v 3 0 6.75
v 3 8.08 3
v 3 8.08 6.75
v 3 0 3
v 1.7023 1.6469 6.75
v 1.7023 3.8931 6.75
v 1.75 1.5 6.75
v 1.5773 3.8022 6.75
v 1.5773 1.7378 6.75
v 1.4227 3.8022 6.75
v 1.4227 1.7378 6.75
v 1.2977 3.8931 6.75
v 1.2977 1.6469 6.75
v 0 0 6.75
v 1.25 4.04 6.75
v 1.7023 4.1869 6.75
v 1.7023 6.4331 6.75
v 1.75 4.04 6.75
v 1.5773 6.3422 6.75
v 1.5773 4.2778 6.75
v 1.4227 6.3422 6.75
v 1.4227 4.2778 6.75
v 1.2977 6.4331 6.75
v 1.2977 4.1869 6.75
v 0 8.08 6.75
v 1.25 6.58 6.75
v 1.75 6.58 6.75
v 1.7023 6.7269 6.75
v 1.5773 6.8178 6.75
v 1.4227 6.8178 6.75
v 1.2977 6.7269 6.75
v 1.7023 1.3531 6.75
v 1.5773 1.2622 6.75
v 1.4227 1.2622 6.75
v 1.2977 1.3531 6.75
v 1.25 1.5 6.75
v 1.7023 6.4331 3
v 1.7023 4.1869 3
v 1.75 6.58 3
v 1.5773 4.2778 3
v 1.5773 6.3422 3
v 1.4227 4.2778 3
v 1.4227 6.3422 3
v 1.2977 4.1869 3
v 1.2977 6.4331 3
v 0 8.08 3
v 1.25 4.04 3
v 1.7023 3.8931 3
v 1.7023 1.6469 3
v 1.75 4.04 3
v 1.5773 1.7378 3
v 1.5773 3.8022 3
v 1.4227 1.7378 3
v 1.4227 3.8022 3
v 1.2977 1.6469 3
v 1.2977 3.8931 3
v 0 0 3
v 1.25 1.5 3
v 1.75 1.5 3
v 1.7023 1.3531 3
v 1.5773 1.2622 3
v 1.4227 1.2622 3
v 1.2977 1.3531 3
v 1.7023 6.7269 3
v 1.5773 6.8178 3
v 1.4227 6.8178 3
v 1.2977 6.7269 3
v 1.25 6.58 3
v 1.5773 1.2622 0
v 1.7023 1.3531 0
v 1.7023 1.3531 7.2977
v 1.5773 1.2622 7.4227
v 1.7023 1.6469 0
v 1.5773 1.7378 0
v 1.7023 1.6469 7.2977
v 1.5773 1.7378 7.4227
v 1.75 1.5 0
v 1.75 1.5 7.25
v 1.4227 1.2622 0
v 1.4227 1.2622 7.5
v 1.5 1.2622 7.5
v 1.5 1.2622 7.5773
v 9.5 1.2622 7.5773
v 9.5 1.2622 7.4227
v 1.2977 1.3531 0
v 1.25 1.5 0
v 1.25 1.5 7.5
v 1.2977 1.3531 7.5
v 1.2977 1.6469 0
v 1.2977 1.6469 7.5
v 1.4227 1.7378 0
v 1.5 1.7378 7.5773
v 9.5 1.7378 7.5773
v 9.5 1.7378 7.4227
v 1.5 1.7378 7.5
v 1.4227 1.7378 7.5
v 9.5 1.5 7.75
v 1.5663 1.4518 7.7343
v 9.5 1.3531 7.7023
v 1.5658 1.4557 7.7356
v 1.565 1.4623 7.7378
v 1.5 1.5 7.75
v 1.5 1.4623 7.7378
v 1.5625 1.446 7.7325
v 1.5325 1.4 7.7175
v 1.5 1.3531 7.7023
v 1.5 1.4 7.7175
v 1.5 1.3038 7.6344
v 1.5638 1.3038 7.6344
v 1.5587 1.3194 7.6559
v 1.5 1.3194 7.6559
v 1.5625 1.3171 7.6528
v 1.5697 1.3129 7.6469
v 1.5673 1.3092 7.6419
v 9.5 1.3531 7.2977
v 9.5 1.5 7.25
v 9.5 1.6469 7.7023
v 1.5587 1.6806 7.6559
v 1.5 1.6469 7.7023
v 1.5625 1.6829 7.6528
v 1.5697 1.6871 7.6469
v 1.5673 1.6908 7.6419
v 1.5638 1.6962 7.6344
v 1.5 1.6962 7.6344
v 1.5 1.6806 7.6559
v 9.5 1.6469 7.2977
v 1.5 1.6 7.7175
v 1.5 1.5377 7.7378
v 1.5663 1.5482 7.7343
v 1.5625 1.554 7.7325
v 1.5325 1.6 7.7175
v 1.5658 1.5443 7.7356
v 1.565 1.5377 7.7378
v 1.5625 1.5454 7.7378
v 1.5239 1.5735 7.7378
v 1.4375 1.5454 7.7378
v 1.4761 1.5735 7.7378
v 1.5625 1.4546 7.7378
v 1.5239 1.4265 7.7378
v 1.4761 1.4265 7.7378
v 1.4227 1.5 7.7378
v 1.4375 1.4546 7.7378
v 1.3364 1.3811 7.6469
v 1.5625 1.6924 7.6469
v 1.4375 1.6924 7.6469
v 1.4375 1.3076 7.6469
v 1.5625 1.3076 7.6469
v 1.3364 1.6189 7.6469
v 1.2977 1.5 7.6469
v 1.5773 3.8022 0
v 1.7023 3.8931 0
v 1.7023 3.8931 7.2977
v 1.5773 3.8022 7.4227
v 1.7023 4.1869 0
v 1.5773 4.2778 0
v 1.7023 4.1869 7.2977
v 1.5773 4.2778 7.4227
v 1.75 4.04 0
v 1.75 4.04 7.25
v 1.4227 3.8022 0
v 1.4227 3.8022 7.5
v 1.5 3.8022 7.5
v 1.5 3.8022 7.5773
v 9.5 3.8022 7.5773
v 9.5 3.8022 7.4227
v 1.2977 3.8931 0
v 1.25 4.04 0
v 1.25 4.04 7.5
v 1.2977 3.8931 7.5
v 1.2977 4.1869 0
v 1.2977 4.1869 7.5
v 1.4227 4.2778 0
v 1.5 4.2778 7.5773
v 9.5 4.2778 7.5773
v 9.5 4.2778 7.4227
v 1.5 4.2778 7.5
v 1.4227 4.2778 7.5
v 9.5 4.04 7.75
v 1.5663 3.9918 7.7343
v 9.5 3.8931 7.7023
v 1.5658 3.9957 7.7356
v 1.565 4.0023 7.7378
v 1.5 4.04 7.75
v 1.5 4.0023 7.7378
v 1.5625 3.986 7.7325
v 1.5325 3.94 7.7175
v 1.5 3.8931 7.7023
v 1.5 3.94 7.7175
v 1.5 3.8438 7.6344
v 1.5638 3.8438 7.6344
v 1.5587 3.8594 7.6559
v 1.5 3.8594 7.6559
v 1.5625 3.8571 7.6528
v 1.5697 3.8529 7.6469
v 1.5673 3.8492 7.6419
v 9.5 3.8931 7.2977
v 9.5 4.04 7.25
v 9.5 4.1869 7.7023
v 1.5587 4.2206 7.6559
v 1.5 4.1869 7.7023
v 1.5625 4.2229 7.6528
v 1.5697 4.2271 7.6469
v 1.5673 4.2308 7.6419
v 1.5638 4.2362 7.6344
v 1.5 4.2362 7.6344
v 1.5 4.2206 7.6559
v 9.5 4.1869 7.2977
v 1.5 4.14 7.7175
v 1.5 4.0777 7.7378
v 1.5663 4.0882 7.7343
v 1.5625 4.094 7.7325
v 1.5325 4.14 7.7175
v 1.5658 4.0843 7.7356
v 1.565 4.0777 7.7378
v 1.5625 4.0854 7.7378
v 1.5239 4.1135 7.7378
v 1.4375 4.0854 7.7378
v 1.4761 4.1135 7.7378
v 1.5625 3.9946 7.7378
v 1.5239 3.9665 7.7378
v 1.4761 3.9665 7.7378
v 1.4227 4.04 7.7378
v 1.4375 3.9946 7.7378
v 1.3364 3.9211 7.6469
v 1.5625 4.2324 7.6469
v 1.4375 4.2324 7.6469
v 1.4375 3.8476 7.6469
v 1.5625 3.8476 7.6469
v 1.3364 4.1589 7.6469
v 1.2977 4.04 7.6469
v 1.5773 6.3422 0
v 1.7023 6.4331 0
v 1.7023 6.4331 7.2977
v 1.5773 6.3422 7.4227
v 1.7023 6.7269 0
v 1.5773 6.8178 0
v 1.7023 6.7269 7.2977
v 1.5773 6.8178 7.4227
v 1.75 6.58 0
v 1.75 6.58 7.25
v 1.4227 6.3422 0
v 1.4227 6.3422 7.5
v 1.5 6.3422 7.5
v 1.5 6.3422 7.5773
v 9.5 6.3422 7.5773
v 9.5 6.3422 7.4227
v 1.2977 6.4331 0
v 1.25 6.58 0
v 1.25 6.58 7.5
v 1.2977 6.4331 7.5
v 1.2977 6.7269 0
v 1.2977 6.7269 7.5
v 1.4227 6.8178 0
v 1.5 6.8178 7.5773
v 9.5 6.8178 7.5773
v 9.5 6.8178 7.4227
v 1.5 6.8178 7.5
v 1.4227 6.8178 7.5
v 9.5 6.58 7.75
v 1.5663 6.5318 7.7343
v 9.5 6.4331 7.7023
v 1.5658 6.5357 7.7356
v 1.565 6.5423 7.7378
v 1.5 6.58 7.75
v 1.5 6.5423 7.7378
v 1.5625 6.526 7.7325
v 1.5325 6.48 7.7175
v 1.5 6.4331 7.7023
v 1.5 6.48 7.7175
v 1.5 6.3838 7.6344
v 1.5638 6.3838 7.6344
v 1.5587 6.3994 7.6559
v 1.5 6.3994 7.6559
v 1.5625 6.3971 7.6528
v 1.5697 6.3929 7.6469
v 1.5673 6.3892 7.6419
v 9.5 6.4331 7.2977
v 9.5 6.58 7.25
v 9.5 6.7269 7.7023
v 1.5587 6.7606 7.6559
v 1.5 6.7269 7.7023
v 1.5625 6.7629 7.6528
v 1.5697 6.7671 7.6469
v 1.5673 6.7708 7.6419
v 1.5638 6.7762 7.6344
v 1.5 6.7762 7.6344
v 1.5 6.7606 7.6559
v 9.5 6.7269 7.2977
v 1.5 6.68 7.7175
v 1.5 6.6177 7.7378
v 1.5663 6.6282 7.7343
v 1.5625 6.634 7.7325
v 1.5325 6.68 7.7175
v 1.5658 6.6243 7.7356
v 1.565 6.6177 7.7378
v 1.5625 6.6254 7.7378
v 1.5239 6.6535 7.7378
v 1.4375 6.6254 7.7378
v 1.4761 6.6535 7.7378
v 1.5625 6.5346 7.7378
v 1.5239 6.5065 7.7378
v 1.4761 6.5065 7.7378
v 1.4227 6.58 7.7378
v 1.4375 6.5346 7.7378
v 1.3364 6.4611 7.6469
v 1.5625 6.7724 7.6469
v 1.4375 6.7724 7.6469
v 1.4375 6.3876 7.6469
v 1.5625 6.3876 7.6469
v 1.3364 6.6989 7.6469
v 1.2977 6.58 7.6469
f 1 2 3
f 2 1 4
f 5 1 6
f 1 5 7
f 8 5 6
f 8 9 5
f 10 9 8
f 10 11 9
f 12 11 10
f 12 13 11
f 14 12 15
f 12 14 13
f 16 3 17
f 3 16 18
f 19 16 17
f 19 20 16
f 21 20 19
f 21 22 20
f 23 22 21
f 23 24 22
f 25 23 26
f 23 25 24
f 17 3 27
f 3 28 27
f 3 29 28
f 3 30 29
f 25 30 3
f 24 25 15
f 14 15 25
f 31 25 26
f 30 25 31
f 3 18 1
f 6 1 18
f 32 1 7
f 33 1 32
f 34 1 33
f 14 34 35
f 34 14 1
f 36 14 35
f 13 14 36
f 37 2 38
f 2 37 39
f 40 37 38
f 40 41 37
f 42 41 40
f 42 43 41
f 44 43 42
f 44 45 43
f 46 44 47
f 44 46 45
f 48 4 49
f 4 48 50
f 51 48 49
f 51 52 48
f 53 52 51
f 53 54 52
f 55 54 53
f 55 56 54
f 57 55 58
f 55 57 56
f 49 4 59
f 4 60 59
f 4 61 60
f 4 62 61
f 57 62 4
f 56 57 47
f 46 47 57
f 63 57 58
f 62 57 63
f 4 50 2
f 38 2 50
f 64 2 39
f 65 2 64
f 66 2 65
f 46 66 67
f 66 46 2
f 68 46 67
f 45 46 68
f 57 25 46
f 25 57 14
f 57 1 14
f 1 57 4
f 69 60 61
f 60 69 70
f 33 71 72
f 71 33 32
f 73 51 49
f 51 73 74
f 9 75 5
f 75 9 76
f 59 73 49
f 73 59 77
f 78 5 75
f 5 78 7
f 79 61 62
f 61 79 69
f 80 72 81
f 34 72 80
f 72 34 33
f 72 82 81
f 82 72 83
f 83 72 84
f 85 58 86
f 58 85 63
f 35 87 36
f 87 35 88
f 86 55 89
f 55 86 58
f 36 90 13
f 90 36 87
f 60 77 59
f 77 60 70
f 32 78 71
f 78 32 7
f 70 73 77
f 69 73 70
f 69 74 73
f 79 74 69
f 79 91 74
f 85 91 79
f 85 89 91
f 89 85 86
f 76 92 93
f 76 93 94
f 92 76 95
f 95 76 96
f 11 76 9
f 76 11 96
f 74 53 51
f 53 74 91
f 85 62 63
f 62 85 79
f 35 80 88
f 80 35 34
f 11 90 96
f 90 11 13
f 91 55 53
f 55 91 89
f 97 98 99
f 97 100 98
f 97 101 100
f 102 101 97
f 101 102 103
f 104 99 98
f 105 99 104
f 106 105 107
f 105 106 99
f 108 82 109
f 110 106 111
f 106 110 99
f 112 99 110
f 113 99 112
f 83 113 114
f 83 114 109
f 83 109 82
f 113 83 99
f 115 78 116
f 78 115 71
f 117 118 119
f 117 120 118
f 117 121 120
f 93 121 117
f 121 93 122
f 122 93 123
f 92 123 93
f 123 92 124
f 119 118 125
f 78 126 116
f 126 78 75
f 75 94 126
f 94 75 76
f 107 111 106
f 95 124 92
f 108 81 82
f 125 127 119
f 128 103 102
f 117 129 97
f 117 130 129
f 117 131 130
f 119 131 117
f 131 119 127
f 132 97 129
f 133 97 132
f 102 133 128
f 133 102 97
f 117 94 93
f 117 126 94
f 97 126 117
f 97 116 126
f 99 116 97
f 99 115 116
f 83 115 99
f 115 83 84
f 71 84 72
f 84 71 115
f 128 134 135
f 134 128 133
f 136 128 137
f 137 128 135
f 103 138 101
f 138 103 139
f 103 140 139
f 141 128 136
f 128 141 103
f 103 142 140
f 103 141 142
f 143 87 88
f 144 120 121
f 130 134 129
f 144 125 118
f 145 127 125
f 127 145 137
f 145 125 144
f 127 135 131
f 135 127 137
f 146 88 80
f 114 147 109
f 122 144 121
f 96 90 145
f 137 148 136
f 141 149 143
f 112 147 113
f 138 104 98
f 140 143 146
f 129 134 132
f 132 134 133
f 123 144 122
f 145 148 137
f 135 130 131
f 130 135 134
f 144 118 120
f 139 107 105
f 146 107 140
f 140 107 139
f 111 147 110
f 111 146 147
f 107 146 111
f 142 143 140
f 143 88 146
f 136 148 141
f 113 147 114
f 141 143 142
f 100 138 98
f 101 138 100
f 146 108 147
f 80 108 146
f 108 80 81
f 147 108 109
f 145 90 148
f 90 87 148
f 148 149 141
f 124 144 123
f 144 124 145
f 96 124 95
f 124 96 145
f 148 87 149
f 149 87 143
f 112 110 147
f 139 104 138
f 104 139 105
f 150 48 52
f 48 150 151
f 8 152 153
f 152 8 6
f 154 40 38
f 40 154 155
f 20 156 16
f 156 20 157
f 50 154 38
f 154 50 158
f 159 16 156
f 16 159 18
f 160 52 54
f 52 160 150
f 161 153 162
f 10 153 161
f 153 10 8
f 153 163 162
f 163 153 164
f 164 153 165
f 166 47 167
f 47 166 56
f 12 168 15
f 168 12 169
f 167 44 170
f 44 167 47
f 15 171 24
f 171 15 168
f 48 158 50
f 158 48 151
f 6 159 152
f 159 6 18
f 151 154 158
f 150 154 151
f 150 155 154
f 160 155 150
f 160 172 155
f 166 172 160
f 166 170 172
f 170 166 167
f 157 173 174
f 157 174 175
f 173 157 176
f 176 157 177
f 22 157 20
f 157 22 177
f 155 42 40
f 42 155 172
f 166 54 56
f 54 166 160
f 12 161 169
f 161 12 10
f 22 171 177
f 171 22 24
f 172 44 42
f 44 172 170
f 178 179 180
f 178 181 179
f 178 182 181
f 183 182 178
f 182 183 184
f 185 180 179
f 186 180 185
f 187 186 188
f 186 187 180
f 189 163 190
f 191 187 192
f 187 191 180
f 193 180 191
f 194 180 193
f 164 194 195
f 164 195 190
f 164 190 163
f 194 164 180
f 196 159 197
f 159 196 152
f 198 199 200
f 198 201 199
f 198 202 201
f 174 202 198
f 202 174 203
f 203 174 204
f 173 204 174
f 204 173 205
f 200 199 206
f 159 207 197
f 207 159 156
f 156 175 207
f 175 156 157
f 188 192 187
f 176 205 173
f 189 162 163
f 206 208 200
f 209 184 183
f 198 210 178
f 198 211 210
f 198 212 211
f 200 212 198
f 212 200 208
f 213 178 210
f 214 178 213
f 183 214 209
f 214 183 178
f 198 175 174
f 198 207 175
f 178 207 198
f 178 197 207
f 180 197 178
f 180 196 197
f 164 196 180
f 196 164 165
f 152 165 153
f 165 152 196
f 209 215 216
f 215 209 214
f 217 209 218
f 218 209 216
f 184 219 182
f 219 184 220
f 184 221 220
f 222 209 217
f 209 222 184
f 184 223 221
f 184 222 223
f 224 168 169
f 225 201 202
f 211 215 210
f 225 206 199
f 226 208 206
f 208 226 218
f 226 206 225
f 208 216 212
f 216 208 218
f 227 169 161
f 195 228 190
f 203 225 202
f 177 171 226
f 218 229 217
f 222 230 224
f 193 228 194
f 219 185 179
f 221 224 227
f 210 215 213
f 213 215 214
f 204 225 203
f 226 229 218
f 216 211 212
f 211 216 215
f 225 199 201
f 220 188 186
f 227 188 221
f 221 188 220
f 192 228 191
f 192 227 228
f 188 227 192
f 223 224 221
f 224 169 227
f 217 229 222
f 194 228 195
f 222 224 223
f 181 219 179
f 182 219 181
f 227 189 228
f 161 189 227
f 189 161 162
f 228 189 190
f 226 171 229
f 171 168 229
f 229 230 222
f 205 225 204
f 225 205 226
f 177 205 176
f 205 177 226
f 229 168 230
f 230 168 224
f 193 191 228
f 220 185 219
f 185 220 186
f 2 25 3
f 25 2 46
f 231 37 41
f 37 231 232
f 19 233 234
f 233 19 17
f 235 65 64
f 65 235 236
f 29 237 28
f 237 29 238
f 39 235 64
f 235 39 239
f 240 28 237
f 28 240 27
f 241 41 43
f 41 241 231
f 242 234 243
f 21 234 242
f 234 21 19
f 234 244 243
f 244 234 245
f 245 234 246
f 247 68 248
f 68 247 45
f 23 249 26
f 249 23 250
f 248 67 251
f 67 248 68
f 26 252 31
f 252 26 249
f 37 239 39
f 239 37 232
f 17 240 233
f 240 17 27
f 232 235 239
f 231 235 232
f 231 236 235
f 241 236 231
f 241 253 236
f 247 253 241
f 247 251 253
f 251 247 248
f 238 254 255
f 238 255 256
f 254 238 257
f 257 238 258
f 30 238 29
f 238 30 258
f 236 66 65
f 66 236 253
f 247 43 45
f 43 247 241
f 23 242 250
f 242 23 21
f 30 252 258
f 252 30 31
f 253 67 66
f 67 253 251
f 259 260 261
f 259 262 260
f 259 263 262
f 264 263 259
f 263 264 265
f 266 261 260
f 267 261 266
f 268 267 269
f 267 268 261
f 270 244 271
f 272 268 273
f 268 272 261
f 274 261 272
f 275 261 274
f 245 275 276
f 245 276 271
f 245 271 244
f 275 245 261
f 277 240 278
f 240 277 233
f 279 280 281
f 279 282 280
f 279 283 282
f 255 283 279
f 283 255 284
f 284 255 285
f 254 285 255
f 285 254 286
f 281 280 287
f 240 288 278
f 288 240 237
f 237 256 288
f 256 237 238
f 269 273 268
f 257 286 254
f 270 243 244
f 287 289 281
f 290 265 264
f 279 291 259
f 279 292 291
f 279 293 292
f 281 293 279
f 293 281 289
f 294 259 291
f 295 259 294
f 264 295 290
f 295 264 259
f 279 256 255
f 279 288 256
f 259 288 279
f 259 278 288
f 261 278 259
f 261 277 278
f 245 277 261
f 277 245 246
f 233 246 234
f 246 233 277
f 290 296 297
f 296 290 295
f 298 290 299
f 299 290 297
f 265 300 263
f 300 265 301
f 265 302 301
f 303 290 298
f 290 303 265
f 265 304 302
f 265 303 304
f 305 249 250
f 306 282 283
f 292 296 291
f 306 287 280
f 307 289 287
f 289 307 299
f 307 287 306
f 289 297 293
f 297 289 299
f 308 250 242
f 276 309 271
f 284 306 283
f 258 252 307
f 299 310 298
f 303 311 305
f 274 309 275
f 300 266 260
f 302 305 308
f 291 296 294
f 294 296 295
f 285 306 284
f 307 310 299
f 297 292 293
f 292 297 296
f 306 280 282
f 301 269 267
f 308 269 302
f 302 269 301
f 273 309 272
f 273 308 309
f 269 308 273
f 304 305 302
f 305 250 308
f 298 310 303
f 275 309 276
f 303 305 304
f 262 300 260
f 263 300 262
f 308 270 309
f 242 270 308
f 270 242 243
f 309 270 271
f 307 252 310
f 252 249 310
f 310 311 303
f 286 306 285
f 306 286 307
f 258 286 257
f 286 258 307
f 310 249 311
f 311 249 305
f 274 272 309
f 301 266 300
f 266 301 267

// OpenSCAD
$fn=10;

right_angle_header(3);

module right_angle_header(num_pins=1) {
	for (i = [1:num_pins]) {
		translate([0,(i-1)*2.54,0])
		one_pin();
	}

	module one_pin() {
		pin_d=0.5;

		translate([0,0,3])
		cube([3,3,3.75]);

		translate([3/2,3/2,0])
		cylinder(h=7.5, d=pin_d);

		translate([3/2,3/2,7.5])
		rotate([0,90,0])
		cylinder(h=8, d=pin_d);

		translate([3/2,3/2,7.5])
		sphere(d=pin_d);
	}
}
